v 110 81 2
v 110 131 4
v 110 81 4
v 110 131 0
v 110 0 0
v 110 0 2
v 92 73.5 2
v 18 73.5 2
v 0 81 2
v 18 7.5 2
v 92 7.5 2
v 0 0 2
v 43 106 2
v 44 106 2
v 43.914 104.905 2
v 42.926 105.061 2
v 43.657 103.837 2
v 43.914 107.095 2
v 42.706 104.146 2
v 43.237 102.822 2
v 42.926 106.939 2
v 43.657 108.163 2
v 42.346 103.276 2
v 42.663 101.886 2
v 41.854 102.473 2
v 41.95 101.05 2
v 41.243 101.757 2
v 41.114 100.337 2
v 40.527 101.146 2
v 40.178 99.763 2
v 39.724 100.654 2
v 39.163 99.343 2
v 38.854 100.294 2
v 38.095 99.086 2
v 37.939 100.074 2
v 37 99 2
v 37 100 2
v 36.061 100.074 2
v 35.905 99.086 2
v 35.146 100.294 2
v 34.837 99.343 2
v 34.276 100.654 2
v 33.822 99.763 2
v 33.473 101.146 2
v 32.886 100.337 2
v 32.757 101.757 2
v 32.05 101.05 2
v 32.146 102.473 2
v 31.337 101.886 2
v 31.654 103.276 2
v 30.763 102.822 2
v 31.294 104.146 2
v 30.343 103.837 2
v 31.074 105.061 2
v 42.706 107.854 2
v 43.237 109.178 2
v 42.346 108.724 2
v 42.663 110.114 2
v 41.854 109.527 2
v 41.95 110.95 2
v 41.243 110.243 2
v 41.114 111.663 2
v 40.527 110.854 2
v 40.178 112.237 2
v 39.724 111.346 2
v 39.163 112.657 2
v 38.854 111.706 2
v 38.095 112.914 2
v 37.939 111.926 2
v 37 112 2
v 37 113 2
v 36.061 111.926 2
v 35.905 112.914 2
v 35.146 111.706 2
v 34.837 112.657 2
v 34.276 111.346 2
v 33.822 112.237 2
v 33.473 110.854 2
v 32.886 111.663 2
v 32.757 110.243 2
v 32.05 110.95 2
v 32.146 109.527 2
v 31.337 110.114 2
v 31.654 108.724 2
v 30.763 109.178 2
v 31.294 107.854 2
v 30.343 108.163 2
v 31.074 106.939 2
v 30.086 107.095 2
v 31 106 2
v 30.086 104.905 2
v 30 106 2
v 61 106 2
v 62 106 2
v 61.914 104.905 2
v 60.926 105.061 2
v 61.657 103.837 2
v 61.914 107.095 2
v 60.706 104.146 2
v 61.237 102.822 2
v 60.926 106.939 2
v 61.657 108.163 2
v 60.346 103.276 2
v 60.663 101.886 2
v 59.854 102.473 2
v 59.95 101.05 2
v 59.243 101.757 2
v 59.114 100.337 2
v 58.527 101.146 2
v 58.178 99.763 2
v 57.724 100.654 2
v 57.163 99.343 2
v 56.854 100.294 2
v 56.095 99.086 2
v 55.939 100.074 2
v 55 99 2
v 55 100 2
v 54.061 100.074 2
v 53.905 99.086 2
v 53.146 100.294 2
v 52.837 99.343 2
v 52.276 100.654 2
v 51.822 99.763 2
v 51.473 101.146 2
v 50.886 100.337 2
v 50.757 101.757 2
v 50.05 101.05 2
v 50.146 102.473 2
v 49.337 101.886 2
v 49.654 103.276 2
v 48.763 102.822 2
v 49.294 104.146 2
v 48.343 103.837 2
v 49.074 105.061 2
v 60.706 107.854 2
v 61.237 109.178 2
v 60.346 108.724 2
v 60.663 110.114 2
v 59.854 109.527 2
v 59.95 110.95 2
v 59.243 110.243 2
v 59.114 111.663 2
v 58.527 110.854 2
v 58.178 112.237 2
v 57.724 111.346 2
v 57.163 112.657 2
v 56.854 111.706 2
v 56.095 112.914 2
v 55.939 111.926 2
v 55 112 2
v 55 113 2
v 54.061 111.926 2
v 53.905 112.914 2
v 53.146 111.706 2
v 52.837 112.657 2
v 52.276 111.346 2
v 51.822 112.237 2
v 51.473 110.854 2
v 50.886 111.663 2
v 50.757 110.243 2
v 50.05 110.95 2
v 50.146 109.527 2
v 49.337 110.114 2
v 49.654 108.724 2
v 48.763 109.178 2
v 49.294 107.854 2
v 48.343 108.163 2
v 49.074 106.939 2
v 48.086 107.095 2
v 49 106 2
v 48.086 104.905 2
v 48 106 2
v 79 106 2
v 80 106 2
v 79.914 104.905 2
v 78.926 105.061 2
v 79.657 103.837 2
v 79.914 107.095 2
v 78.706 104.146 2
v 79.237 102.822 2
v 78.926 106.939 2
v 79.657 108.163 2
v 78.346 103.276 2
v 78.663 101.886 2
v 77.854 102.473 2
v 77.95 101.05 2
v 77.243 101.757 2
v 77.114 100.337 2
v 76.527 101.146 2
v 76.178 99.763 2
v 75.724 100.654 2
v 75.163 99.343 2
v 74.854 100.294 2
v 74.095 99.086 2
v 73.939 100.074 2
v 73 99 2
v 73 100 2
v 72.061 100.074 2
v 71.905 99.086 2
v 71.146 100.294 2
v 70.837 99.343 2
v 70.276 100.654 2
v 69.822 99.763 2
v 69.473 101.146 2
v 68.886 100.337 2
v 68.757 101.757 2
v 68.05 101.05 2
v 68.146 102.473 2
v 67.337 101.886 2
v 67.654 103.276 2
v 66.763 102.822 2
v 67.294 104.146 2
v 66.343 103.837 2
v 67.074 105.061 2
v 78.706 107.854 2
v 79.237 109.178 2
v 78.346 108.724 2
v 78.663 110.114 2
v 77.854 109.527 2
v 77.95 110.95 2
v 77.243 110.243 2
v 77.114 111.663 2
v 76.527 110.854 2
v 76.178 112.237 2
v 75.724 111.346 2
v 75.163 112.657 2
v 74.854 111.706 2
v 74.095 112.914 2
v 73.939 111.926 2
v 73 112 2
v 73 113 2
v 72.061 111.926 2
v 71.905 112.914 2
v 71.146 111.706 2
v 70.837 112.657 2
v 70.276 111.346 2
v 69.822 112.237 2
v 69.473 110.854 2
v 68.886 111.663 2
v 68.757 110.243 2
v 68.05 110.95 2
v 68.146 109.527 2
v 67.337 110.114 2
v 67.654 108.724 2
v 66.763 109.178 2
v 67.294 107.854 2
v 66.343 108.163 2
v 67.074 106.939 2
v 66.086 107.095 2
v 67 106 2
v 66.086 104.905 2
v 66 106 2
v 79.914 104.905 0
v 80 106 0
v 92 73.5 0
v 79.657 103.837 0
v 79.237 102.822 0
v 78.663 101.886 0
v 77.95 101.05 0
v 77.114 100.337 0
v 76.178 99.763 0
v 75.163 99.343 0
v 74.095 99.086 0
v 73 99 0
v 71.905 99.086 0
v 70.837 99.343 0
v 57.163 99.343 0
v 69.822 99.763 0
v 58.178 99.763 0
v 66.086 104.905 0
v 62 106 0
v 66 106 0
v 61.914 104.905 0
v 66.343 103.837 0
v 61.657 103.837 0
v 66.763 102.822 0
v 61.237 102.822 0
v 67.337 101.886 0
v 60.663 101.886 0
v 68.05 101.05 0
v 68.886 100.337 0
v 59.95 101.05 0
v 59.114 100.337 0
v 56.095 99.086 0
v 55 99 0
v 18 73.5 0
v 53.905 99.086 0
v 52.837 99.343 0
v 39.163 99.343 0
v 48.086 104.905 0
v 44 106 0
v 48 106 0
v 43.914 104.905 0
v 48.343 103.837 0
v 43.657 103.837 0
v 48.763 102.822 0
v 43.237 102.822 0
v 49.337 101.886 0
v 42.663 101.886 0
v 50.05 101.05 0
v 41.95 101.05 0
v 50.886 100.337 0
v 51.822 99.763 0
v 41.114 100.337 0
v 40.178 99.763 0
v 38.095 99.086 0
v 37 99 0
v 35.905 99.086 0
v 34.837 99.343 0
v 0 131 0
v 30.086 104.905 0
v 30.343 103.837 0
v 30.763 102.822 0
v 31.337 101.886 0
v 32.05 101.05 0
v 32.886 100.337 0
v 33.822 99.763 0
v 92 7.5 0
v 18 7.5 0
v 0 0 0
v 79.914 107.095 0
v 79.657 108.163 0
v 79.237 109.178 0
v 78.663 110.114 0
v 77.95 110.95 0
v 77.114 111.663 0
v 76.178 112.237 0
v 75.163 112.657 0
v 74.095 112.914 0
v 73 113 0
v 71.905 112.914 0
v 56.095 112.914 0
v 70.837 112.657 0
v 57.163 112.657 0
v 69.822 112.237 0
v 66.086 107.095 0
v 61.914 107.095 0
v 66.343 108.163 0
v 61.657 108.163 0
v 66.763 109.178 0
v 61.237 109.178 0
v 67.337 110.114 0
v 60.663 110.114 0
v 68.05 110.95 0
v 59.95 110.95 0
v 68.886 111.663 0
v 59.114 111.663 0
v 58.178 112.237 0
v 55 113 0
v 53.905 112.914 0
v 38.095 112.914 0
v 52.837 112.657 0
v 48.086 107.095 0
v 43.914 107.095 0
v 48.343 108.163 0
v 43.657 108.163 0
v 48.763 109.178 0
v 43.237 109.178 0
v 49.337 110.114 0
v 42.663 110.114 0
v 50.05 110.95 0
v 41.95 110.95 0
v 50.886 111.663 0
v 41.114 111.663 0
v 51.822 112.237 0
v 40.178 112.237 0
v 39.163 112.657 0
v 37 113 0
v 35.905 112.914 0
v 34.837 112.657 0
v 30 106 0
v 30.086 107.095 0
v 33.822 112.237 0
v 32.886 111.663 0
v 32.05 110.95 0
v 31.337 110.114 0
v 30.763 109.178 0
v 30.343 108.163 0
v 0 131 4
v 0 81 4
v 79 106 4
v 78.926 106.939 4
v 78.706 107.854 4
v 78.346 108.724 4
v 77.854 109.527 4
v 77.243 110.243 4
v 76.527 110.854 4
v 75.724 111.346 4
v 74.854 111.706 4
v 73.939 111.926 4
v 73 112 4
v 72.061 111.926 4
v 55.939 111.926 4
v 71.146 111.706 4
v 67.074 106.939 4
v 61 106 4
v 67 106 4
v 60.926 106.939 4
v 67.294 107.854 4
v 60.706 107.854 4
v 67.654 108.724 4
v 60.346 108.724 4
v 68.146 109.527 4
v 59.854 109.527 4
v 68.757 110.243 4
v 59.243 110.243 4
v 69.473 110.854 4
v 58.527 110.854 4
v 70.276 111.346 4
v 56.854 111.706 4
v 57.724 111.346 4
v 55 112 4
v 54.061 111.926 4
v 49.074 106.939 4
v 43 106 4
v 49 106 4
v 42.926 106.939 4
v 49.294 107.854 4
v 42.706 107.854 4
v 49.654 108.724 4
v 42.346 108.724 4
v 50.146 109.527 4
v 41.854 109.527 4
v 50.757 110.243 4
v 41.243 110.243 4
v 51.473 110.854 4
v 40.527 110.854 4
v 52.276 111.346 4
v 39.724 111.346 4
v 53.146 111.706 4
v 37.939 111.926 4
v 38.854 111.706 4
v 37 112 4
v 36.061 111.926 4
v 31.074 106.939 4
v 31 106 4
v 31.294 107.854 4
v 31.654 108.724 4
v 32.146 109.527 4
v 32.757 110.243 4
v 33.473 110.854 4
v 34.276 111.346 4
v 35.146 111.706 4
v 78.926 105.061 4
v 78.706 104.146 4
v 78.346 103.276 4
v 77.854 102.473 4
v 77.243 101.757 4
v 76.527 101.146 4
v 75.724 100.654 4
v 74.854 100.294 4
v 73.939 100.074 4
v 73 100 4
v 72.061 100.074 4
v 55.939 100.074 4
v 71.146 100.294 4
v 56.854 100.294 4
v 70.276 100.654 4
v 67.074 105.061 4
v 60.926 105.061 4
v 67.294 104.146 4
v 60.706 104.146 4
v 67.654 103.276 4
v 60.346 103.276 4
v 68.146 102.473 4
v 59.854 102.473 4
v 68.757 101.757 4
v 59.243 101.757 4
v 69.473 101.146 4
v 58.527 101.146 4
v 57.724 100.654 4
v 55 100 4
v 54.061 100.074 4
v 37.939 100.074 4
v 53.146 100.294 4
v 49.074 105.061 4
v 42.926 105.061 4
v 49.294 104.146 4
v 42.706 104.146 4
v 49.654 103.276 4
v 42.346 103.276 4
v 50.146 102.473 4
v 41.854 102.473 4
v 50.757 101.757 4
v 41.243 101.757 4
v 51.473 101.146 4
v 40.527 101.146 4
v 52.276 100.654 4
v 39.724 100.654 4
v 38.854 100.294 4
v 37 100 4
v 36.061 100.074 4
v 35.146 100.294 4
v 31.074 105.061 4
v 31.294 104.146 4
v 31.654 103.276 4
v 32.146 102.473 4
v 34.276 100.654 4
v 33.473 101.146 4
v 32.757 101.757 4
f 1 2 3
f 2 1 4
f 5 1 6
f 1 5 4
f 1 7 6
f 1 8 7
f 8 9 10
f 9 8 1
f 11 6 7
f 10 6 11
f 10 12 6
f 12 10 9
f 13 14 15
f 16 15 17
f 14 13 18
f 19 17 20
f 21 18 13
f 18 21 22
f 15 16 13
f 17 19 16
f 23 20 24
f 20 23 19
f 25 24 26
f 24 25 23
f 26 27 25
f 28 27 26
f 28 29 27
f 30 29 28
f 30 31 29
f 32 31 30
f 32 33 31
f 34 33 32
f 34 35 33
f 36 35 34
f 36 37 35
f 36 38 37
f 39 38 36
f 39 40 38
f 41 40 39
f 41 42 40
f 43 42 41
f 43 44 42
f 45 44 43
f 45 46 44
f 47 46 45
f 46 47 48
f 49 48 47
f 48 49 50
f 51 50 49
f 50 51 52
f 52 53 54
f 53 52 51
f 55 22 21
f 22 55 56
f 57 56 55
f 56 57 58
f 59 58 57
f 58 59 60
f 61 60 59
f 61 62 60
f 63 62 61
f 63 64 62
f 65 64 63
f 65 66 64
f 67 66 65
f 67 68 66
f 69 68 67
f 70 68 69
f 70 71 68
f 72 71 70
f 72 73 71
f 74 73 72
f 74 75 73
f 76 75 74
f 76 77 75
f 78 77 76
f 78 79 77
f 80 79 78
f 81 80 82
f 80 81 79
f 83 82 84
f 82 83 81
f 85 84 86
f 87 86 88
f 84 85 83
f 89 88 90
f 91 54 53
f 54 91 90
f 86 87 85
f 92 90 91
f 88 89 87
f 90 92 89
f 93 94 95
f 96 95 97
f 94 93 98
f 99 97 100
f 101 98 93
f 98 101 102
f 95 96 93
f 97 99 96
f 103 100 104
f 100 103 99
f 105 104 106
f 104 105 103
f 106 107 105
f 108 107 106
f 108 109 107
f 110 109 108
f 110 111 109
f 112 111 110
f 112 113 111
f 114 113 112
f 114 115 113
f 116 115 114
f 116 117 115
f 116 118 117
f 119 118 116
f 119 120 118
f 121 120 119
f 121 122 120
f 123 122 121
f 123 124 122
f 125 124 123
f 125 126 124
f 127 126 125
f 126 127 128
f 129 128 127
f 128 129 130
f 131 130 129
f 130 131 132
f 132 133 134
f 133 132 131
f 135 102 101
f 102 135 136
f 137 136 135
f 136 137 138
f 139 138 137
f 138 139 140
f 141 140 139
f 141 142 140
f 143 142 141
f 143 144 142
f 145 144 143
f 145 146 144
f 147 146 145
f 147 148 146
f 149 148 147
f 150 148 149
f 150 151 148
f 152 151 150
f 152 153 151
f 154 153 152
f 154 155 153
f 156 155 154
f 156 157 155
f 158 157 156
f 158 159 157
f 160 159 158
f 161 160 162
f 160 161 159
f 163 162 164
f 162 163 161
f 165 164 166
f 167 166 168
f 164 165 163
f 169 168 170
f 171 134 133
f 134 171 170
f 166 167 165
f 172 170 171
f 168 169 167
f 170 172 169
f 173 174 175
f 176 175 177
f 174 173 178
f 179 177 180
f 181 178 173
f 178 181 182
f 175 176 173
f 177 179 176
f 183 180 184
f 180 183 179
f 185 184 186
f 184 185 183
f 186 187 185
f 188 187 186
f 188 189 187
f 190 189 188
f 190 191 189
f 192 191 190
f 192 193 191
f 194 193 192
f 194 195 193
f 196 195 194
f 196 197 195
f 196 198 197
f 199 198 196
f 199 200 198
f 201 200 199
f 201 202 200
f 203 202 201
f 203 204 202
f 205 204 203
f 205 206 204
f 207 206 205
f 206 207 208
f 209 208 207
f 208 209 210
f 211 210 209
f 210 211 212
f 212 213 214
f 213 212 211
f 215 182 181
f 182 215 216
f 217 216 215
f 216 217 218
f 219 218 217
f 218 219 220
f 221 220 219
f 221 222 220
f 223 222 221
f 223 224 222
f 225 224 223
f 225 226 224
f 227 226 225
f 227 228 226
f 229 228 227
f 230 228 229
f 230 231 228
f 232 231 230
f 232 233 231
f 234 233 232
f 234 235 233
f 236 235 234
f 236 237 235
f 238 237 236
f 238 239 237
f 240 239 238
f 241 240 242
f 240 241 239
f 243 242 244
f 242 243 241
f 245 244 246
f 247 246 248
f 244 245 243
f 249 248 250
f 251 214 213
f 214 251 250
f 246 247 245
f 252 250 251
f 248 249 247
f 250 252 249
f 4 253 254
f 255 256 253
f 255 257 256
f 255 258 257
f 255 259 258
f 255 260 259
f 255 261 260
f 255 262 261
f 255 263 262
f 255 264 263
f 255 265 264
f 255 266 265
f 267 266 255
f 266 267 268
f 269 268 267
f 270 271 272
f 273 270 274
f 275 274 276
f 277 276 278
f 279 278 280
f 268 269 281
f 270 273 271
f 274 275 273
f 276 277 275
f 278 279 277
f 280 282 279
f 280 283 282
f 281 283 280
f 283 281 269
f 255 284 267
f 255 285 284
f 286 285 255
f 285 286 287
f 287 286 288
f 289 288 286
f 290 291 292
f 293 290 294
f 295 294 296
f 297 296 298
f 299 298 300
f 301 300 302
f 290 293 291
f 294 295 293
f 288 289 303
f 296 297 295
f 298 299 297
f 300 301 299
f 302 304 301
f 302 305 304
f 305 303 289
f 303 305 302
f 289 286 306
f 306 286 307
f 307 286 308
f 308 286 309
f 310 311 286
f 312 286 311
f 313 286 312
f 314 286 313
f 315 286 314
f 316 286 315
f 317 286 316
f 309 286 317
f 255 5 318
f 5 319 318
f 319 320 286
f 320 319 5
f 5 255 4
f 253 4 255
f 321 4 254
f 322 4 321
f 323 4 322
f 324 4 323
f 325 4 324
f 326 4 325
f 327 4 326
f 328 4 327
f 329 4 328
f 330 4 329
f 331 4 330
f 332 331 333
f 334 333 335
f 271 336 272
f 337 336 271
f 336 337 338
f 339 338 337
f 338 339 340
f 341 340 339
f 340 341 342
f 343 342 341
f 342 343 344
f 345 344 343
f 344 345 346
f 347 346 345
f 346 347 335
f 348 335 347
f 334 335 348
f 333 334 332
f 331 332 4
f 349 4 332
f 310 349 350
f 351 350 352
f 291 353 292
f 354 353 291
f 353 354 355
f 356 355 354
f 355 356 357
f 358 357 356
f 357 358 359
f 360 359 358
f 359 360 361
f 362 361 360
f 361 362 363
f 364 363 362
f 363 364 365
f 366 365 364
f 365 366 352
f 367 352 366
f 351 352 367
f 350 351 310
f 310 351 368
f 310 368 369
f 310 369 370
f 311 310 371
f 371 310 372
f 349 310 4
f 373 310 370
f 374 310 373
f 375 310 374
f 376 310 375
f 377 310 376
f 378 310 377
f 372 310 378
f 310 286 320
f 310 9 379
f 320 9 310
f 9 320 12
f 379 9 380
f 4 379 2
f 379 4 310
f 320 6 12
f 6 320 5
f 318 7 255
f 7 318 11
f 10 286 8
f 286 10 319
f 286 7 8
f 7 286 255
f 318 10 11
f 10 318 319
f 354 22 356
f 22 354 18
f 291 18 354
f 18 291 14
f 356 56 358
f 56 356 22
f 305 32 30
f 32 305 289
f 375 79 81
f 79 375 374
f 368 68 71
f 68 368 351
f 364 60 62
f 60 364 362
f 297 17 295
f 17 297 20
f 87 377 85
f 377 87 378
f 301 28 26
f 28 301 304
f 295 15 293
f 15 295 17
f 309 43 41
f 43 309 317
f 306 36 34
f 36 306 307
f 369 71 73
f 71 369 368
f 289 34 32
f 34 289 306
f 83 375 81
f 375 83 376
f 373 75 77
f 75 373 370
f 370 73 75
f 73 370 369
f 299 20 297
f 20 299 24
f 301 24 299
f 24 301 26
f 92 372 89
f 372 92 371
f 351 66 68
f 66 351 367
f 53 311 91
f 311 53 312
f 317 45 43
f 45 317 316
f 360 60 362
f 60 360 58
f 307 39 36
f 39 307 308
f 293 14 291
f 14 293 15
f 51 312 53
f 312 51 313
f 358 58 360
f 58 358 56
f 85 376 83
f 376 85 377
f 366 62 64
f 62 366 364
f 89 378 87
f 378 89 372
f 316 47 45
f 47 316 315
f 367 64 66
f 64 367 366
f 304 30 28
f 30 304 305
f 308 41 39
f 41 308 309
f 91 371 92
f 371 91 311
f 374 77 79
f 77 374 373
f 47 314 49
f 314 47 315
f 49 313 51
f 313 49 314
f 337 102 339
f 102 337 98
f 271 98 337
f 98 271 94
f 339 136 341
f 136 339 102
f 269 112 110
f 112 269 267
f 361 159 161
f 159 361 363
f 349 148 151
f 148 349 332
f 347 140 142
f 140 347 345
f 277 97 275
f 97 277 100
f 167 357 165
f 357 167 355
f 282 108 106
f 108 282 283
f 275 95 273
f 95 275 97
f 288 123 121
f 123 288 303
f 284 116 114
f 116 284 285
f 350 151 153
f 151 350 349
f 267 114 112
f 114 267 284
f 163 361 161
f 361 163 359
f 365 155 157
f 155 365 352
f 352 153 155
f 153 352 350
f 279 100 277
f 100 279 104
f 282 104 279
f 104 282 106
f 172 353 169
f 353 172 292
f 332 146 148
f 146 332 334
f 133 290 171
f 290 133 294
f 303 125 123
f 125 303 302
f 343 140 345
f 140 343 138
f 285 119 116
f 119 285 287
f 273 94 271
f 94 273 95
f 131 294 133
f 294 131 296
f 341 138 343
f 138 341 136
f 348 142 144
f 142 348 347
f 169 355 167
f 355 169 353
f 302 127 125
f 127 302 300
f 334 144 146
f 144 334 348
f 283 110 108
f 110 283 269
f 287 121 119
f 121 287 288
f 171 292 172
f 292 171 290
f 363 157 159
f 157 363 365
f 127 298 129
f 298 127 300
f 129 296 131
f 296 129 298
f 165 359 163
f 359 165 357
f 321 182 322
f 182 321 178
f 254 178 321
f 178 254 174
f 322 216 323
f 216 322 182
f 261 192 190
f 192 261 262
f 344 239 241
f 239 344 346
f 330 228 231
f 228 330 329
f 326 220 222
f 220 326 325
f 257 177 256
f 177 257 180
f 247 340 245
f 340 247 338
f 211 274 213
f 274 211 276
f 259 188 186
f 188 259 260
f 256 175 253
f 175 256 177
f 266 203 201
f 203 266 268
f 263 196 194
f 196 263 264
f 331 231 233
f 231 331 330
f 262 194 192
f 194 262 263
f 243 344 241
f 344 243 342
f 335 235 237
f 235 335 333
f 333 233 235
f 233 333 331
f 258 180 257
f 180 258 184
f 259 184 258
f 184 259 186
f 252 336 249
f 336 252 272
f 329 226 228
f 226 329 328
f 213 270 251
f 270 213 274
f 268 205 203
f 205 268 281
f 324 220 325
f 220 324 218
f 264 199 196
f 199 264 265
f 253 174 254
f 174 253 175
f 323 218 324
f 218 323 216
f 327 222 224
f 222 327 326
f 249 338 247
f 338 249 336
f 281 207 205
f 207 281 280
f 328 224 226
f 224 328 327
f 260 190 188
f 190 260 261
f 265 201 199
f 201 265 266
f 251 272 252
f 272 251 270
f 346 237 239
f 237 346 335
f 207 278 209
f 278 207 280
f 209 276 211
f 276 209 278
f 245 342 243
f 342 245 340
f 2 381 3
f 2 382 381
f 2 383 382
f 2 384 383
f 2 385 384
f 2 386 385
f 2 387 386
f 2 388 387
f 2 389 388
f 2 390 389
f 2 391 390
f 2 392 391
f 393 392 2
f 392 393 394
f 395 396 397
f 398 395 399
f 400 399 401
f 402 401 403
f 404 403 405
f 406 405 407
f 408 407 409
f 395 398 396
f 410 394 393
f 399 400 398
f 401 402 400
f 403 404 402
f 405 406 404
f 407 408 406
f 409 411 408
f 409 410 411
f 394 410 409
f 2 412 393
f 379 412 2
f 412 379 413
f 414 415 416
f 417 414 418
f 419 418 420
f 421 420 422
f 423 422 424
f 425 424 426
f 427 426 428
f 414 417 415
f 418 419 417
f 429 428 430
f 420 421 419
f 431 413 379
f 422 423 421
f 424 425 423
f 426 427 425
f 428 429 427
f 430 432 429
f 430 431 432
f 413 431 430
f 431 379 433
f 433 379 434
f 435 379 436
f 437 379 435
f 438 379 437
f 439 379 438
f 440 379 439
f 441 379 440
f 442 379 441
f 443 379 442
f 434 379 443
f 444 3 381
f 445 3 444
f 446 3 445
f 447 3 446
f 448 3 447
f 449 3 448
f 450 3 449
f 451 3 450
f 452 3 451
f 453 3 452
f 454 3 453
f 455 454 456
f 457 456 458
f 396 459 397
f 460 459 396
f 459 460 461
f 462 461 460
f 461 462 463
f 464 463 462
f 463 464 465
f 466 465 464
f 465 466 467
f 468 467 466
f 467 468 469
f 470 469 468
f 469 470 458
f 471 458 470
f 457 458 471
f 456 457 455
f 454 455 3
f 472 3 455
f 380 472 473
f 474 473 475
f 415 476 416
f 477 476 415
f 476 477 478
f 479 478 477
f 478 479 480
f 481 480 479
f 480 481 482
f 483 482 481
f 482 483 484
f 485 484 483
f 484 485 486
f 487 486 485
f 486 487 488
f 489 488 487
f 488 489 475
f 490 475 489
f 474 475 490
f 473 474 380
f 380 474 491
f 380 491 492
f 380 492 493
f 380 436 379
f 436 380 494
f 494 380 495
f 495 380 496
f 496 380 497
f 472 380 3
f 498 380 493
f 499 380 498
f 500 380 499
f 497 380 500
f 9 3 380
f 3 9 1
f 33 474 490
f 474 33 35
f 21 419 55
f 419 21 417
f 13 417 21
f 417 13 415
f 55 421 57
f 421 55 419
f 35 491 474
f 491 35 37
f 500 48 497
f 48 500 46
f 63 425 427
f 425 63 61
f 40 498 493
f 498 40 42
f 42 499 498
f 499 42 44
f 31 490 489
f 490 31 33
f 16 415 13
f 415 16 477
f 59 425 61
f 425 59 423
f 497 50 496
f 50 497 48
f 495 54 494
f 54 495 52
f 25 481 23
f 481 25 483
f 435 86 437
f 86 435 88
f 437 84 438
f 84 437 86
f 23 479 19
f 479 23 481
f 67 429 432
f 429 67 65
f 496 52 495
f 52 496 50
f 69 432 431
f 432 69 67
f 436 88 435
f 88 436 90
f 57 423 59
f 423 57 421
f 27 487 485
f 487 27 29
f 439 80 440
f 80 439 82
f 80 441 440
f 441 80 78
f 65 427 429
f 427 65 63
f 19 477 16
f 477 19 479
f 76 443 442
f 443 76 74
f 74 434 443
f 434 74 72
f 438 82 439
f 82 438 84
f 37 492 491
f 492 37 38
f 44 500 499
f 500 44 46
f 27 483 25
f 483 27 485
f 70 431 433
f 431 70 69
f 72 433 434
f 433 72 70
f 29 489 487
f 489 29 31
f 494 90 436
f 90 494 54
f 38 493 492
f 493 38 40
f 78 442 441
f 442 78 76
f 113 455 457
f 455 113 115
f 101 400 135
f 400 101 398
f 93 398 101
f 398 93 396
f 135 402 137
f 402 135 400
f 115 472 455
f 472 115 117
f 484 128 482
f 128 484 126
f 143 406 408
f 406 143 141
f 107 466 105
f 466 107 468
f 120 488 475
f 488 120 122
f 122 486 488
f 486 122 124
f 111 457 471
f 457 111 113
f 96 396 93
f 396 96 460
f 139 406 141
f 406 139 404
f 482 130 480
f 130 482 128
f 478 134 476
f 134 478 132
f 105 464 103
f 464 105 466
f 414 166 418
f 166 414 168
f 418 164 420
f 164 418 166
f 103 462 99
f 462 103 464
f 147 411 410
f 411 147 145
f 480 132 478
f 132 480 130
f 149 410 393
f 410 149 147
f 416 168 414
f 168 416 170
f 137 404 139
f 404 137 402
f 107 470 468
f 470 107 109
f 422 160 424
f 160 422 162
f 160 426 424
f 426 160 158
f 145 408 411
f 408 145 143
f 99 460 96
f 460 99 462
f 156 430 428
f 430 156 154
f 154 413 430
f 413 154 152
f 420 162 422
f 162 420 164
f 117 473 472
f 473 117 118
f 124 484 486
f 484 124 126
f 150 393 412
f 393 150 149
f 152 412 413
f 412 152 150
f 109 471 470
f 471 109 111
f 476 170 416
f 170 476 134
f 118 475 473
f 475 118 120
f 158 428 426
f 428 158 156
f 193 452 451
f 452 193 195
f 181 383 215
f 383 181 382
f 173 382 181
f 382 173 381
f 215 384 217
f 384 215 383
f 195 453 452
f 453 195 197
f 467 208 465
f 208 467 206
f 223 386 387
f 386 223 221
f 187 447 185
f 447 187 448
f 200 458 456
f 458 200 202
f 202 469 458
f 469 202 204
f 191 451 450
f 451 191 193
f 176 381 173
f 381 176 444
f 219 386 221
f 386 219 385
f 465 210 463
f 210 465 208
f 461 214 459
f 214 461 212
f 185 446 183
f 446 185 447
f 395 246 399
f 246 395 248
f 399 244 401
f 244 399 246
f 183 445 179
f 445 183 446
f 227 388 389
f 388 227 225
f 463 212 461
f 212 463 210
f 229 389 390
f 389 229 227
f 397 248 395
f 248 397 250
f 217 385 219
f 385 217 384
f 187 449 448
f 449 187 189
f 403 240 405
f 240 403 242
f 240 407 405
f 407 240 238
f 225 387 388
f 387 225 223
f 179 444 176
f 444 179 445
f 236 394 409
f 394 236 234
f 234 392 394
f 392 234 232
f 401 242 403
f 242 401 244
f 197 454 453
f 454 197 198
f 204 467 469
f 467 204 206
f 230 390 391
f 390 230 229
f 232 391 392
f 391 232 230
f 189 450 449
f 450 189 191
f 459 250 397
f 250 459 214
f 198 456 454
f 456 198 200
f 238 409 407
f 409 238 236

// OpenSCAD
$fn = 40;

screenwidth = 110;
screenheight = 81;
screendepth = 20;
screeninnerwidth = 74;
screeninnerheight = 66;
bottomplateheight = 50;
boxdepth = 30;

module main(){
    difference(){
        cube([screenwidth, screenheight + bottomplateheight, 2]);
        translate([(screenwidth - screeninnerwidth) /2, (screenheight - screeninnerheight) /2, -1]){
            cube([screeninnerwidth, screeninnerheight, 4]);
        }
        translate([(screenwidth/2)-18, screenheight + (bottomplateheight/2), -1]) cylinder(r=7, h=6);
        translate([(screenwidth/2), screenheight + (bottomplateheight/2), -1]) cylinder(r=7, h=6);
        translate([(screenwidth/2)+18, screenheight + (bottomplateheight/2), -1]) cylinder(r=7, h=6);
    }
    difference(){
        translate([0, screenheight, 2]) cube([screenwidth, bottomplateheight, 2]);
        translate([(screenwidth/2)-18, screenheight +(bottomplateheight/2), -1]) cylinder(r=6, h=6);
        translate([(screenwidth/2), screenheight +(bottomplateheight/2), -1]) cylinder(r=6, h=6);
        translate([(screenwidth/2)+18, screenheight +(bottomplateheight/2), -1]) cylinder(r=6, h=6);
    }
}

//for test
module Ydisplay(){
    color("green"){
        translate([0, 0, 2]){
            cube([screenwidth, screenheight, 3]);
            translate([(screenwidth - screeninnerwidth)/2, (screenheight - screeninnerheight)/2, -17]){
                cube([screeninnerwidth, screeninnerheight, 20]);
            }
        }
    }
    translate([screenwidth/2,screenheight/2,5]){
        color("blue") cube([58, 32, 2], center=true);
    }
}
module buttonpcb(){
    translate([screenwidth/2, screenheight+(bottomplateheight/2), -11]){
        color("green") cube([70, 42, 2],center=true);

        translate([0,0,2]) color("green") cube([12, 12, 3],center=true);
        translate([0,0,3]){
            color("green") cylinder(r=3, h=8);
            translate([0,0,8])  color("blue") cylinder(r=7, h=2);
            translate([0,0,10]) color("blue")  cylinder(r=6, h=5);
        }

        translate([-18,0,0]){
            translate([0,0,2]) color("green") cube([12, 12, 3],center=true);
            translate([0,0,3]){
                color("green") cylinder(r=3, h=8);
                translate([0,0,8])  color("white")  cylinder(r=7, h=2);
                translate([0,0,10]) color("white")  cylinder(r=6, h=5);
            }
        }

        translate([18,0,0]){
            translate([0,0,2]) color("green") cube([12, 12, 3],center=true);
            translate([0,0,3]){
                color("green") cylinder(r=3, h=8);
                translate([0,0,8])  color("white") cylinder(r=7, h=2);
                translate([0,0,10]) color("white") cylinder(r=6, h=5);
            }
        }
    }
}
//Ydisplay();
//buttonpcb();
main();
